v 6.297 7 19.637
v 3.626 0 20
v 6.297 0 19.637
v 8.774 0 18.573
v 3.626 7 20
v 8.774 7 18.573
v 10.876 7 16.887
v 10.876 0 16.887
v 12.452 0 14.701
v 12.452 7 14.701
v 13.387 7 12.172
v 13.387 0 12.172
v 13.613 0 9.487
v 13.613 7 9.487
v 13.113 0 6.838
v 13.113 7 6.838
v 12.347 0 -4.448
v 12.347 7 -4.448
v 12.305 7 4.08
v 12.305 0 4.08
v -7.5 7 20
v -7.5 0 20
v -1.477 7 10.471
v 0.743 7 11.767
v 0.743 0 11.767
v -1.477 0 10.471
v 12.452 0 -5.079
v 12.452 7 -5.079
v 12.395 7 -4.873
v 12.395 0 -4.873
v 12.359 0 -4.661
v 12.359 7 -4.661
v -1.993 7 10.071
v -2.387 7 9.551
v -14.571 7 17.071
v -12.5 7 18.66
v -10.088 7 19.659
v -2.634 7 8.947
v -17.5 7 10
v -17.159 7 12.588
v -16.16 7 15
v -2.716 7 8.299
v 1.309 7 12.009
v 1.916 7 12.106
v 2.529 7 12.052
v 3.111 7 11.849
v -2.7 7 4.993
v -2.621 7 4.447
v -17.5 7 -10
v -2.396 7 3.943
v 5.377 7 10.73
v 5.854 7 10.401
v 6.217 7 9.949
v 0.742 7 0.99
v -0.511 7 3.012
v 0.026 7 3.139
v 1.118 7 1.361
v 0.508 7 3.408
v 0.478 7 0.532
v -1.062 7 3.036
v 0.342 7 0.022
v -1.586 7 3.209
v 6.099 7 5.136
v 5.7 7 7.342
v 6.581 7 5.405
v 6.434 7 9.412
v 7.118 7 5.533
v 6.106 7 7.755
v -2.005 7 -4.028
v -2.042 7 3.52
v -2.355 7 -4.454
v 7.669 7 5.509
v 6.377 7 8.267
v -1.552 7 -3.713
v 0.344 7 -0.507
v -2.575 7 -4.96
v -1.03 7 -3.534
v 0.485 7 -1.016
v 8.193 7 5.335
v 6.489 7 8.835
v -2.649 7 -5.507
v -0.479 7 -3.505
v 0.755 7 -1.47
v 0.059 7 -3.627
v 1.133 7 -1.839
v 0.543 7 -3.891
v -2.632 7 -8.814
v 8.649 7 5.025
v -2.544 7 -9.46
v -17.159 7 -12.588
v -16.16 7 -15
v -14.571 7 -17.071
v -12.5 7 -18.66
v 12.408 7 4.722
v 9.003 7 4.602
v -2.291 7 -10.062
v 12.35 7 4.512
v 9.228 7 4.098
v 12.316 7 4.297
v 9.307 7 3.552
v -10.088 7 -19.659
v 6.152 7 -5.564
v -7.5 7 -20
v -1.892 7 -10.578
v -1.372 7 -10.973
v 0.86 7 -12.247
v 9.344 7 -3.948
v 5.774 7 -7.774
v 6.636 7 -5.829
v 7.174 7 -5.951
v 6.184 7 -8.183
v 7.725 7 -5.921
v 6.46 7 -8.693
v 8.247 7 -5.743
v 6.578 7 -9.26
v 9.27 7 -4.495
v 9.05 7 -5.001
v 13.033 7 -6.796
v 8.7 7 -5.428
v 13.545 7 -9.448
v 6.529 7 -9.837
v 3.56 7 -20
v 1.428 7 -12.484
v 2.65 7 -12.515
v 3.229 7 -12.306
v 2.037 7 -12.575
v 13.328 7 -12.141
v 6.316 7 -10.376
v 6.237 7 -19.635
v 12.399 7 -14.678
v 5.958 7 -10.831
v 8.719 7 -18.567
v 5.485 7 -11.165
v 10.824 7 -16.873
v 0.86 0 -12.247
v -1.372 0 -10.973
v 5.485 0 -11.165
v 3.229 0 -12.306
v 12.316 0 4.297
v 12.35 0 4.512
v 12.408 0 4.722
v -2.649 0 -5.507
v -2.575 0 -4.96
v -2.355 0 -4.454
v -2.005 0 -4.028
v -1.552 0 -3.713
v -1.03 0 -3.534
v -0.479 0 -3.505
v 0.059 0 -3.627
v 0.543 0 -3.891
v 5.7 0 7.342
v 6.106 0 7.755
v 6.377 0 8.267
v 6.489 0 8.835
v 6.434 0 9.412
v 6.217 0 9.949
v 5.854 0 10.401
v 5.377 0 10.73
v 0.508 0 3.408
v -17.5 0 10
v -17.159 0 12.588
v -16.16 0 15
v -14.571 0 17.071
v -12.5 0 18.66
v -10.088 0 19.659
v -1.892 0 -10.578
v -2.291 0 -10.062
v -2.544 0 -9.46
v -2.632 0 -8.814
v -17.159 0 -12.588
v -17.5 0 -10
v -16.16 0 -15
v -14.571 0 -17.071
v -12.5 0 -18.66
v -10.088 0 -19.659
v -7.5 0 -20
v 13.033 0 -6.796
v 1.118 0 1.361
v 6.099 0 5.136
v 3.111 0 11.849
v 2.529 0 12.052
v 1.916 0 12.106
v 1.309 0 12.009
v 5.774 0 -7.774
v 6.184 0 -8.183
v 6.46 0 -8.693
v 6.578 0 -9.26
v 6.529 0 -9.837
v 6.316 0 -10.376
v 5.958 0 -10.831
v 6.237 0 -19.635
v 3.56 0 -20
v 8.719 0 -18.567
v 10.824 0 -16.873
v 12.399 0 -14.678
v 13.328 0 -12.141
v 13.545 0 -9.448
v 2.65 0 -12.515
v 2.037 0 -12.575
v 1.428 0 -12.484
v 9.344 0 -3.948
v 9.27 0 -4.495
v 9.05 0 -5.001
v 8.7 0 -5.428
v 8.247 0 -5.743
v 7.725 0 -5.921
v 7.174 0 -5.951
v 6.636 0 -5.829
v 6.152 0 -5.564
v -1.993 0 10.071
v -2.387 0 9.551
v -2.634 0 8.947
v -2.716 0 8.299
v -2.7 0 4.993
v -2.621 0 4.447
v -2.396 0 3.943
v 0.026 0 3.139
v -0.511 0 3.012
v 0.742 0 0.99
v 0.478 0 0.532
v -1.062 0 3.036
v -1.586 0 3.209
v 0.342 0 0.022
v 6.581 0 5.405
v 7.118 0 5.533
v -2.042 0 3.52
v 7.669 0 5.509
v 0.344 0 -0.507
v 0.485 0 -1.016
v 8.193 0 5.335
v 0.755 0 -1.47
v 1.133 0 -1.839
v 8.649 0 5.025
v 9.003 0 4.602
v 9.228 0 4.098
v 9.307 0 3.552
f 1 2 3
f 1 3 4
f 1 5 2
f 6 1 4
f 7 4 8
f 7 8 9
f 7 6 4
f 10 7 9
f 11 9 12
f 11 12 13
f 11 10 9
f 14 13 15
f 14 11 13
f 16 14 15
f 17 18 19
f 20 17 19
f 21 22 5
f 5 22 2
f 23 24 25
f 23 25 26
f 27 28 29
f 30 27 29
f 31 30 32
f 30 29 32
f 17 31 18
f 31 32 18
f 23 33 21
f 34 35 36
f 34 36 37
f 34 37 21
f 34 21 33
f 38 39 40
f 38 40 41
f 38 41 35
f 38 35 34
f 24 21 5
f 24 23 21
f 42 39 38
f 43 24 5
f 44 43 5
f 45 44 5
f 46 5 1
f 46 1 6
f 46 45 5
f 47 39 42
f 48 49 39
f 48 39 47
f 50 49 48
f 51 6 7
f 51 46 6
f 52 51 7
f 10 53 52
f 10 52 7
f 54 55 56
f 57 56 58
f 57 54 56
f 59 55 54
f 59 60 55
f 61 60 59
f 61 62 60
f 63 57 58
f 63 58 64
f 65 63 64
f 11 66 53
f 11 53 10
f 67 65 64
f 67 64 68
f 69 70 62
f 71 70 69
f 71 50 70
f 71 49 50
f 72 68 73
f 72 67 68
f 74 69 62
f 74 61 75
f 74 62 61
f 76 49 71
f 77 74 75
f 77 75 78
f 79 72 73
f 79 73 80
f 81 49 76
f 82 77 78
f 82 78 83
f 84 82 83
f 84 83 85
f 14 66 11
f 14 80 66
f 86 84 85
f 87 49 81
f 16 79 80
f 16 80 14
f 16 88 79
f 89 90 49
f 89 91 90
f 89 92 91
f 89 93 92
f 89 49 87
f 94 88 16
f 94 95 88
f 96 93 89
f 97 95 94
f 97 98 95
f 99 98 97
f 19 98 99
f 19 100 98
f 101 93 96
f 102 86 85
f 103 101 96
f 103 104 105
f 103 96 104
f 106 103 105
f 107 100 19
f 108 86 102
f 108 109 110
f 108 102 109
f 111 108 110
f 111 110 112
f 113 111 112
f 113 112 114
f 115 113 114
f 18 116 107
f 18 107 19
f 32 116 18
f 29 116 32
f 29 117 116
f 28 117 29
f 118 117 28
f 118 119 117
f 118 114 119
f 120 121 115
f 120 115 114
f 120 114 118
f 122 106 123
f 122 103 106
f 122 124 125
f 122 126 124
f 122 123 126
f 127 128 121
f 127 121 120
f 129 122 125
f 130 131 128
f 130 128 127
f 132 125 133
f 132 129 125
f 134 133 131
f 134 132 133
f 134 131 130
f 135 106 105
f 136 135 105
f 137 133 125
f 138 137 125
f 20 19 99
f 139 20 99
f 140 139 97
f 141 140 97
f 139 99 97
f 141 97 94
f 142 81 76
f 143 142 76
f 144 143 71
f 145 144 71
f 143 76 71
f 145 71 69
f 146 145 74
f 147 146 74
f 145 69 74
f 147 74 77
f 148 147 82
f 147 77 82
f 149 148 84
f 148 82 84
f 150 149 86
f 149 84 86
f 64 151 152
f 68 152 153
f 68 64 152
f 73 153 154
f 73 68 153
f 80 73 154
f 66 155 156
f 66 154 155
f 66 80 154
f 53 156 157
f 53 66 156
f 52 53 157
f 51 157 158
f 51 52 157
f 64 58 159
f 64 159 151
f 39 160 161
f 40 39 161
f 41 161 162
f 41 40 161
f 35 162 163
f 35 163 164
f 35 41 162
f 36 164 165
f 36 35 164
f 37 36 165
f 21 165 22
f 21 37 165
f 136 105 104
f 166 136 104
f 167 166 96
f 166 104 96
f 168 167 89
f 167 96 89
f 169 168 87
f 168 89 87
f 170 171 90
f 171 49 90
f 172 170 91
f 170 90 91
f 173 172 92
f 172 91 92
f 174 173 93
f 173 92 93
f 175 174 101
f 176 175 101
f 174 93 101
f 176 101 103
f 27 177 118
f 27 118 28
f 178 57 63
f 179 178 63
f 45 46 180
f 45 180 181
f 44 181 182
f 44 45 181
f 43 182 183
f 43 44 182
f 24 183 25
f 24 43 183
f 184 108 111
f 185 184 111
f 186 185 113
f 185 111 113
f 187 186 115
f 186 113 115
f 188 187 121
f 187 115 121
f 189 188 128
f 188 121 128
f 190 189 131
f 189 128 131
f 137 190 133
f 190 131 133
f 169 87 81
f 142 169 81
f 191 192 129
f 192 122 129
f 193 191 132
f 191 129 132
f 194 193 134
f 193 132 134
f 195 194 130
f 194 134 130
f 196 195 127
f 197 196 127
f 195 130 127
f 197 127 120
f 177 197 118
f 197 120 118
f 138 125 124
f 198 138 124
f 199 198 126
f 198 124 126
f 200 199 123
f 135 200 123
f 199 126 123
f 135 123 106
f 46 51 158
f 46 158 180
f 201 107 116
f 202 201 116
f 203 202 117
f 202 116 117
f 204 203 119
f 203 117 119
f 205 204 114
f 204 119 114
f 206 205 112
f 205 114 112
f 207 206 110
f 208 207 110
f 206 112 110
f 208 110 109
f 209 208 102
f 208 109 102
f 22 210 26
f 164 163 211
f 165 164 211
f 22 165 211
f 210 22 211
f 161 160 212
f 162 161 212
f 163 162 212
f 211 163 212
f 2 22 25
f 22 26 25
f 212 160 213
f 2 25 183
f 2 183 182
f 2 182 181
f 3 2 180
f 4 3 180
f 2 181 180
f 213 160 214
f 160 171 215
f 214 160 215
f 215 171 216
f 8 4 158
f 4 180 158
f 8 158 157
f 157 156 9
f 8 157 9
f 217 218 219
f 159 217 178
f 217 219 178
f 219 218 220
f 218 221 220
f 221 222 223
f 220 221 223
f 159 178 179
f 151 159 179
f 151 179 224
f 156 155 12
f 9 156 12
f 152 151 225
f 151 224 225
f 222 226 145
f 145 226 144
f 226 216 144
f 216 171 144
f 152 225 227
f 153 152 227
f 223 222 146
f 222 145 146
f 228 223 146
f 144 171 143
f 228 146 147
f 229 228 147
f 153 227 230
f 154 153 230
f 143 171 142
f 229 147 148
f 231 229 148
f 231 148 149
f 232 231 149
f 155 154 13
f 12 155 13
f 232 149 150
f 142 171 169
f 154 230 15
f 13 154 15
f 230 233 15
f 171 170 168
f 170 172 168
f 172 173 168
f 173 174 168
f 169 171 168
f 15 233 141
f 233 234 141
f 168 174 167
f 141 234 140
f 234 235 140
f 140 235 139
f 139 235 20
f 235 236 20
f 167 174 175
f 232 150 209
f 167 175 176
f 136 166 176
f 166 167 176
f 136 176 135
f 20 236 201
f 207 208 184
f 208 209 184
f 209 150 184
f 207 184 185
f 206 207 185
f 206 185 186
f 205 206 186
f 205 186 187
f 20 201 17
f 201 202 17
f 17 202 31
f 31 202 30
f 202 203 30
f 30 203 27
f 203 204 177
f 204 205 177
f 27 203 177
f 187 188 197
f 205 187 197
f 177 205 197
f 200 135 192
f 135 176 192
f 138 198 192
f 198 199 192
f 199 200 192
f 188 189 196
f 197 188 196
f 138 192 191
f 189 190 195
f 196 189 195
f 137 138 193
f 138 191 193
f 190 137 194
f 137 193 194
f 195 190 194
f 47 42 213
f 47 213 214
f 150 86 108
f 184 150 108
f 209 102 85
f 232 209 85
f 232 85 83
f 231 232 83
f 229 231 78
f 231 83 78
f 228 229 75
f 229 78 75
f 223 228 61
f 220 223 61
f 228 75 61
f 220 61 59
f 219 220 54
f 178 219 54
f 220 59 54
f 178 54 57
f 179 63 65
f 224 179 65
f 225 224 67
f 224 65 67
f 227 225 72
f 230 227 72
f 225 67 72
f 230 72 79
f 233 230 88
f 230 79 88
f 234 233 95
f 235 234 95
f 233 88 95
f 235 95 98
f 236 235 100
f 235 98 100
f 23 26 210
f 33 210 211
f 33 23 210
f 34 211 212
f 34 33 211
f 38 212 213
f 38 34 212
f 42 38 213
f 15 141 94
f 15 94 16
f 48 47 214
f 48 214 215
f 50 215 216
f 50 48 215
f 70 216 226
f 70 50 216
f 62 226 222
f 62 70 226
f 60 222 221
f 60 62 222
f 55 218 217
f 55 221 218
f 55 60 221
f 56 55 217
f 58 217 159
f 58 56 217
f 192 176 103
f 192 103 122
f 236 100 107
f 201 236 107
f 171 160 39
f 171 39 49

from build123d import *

# Parameters (mm, degrees)
SKETCH1_W           = 35
SKETCH1_H           = 40
BOSS_EXTRUDE1_DEPTH = 7
CUT_EXTRUDE1_DEPTH  = 8
FILLET1_R           = 10


with BuildPart() as part:
    # Sketch1 → Boss-Extrude1 (new body)
    with BuildSketch(Plane(origin=(0, 0, 0), x_dir=(1, 0, 0), z_dir=(0, 1, 0))):
        Rectangle(SKETCH1_W, SKETCH1_H)
    extrude(amount=BOSS_EXTRUDE1_DEPTH)

    # Sketch2 → Cut-Extrude1 (cut)
    with BuildSketch(Plane(origin=(0, 7, 0), x_dir=(1, 0, 0), z_dir=(0, 1, 0))):
        with BuildLine():
            Line((15.25007819, 6.222406887), (17.5, 5.083636977))
            Line((17.5, 5.083636977), (17.5, 20))
            Line((17.5, 20), (12.452367732, 5.078850678))
            ThreePointArc((12.452367732, 5.078850678), (13.590179491, 6.289271676), (15.25007819, 6.222406887))
        make_face()
        with BuildLine():
            Line((17.5, -4.742517197), (17.5, 5.083636977))
            Line((17.5, 5.083636977), (15.25007819, 6.222406887))
            ThreePointArc((15.25007819, 6.222406887), (13.590179491, 6.289271676), (12.452367732, 5.078850678))
            ThreePointArc((12.452367732, 5.078850678), (12.374244311, 4.767544782), (12.346923988, 4.447750739))
            Line((12.346923988, 4.447750739), (12.305154889, -4.080011014))
            ThreePointArc((12.305154889, -4.080011014), (12.330174144, -4.405315746), (12.407751507, -4.722224068))
            ThreePointArc((12.407751507, -4.722224068), (13.535222521, -5.935678289), (15.190785632, -5.883020714))
            Line((15.190785632, -5.883020714), (17.5, -4.742517197))
        make_face()
        with BuildLine():
            Line((17.5, -20), (17.5, -4.742517197))
            Line((17.5, -4.742517197), (15.190785632, -5.883020714))
            ThreePointArc((15.190785632, -5.883020714), (13.535222521, -5.935678289), (12.407751507, -4.722224068))
            Line((12.407751507, -4.722224068), (17.5, -20))
        make_face()
        with BuildLine():
            Line((1.11774743, -1.361450371), (6.099320122, -5.135895168))
            ThreePointArc((6.099320122, -5.135895168), (8.192797189, -5.335005696), (9.307118466, -3.551587818))
            Line((9.307118466, -3.551587818), (9.343853133, 3.94832222))
            ThreePointArc((9.343853133, 3.94832222), (8.247055315, 5.742570191), (6.151728246, 5.563976485))
            Line((6.151728246, 5.563976485), (1.133420888, 1.838511245))
            ThreePointArc((1.133420888, 1.838511245), (0.325593755, 0.242448801), (1.11774743, -1.361450371))
        make_face()
        with BuildLine():
            Line((-2.632460294, 8.813664358), (-2.648655993, 5.507079694))
            ThreePointArc((-2.648655993, 5.507079694), (-1.551858174, 3.712831723), (0.543468894, 3.891425428))
            Line((0.543468894, 3.891425428), (5.773694974, 7.774213801))
            ThreePointArc((5.773694974, 7.774213801), (6.574320559, 9.549924863), (5.484724289, 11.164524215))
            Line((5.484724289, 11.164524215), (3.228851981, 12.306305896))
            ThreePointArc((3.228851981, 12.306305896), (2.037191792, 12.574954754), (0.86049862, 12.246900805))
            Line((0.86049862, 12.246900805), (-1.371870903, 10.972579453))
            ThreePointArc((-1.371870903, 10.972579453), (-2.291405376, 10.06200886), (-2.632460294, 8.813664358))
        make_face()
        with BuildLine():
            Line((0.507713818, -3.408487008), (5.699653959, -7.3423233))
            ThreePointArc((5.699653959, -7.3423233), (6.482846631, -9.125791927), (5.377486357, -10.729640351))
            Line((5.377486357, -10.729640351), (3.110537628, -11.849269189))
            ThreePointArc((3.110537628, -11.849269189), (1.916302986, -12.1062319), (0.742879821, -11.766667047))
            Line((0.742879821, -11.766667047), (-1.476899604, -10.470539006))
            ThreePointArc((-1.476899604, -10.470539006), (-2.387470197, -9.551004532), (-2.716280225, -8.299379022))
            Line((-2.716280225, -8.299379022), (-2.700084526, -4.992794358))
            ThreePointArc((-2.700084526, -4.992794358), (-1.585763249, -3.20937648), (0.507713818, -3.408487008))
        make_face()
    extrude(amount=-CUT_EXTRUDE1_DEPTH, mode=Mode.SUBTRACT)

    # Fillet1
    fillet1_edges = [part.edges().sort_by_distance(p)[0] for p in [
        (17.5, 3.5, 20),
        (-17.5, 3.5, 20),
        (-17.5, 3.5, -20),
        (17.5, 3.5, -20),
    ]]
    fillet(fillet1_edges, radius=FILLET1_R)


solid = part.part
